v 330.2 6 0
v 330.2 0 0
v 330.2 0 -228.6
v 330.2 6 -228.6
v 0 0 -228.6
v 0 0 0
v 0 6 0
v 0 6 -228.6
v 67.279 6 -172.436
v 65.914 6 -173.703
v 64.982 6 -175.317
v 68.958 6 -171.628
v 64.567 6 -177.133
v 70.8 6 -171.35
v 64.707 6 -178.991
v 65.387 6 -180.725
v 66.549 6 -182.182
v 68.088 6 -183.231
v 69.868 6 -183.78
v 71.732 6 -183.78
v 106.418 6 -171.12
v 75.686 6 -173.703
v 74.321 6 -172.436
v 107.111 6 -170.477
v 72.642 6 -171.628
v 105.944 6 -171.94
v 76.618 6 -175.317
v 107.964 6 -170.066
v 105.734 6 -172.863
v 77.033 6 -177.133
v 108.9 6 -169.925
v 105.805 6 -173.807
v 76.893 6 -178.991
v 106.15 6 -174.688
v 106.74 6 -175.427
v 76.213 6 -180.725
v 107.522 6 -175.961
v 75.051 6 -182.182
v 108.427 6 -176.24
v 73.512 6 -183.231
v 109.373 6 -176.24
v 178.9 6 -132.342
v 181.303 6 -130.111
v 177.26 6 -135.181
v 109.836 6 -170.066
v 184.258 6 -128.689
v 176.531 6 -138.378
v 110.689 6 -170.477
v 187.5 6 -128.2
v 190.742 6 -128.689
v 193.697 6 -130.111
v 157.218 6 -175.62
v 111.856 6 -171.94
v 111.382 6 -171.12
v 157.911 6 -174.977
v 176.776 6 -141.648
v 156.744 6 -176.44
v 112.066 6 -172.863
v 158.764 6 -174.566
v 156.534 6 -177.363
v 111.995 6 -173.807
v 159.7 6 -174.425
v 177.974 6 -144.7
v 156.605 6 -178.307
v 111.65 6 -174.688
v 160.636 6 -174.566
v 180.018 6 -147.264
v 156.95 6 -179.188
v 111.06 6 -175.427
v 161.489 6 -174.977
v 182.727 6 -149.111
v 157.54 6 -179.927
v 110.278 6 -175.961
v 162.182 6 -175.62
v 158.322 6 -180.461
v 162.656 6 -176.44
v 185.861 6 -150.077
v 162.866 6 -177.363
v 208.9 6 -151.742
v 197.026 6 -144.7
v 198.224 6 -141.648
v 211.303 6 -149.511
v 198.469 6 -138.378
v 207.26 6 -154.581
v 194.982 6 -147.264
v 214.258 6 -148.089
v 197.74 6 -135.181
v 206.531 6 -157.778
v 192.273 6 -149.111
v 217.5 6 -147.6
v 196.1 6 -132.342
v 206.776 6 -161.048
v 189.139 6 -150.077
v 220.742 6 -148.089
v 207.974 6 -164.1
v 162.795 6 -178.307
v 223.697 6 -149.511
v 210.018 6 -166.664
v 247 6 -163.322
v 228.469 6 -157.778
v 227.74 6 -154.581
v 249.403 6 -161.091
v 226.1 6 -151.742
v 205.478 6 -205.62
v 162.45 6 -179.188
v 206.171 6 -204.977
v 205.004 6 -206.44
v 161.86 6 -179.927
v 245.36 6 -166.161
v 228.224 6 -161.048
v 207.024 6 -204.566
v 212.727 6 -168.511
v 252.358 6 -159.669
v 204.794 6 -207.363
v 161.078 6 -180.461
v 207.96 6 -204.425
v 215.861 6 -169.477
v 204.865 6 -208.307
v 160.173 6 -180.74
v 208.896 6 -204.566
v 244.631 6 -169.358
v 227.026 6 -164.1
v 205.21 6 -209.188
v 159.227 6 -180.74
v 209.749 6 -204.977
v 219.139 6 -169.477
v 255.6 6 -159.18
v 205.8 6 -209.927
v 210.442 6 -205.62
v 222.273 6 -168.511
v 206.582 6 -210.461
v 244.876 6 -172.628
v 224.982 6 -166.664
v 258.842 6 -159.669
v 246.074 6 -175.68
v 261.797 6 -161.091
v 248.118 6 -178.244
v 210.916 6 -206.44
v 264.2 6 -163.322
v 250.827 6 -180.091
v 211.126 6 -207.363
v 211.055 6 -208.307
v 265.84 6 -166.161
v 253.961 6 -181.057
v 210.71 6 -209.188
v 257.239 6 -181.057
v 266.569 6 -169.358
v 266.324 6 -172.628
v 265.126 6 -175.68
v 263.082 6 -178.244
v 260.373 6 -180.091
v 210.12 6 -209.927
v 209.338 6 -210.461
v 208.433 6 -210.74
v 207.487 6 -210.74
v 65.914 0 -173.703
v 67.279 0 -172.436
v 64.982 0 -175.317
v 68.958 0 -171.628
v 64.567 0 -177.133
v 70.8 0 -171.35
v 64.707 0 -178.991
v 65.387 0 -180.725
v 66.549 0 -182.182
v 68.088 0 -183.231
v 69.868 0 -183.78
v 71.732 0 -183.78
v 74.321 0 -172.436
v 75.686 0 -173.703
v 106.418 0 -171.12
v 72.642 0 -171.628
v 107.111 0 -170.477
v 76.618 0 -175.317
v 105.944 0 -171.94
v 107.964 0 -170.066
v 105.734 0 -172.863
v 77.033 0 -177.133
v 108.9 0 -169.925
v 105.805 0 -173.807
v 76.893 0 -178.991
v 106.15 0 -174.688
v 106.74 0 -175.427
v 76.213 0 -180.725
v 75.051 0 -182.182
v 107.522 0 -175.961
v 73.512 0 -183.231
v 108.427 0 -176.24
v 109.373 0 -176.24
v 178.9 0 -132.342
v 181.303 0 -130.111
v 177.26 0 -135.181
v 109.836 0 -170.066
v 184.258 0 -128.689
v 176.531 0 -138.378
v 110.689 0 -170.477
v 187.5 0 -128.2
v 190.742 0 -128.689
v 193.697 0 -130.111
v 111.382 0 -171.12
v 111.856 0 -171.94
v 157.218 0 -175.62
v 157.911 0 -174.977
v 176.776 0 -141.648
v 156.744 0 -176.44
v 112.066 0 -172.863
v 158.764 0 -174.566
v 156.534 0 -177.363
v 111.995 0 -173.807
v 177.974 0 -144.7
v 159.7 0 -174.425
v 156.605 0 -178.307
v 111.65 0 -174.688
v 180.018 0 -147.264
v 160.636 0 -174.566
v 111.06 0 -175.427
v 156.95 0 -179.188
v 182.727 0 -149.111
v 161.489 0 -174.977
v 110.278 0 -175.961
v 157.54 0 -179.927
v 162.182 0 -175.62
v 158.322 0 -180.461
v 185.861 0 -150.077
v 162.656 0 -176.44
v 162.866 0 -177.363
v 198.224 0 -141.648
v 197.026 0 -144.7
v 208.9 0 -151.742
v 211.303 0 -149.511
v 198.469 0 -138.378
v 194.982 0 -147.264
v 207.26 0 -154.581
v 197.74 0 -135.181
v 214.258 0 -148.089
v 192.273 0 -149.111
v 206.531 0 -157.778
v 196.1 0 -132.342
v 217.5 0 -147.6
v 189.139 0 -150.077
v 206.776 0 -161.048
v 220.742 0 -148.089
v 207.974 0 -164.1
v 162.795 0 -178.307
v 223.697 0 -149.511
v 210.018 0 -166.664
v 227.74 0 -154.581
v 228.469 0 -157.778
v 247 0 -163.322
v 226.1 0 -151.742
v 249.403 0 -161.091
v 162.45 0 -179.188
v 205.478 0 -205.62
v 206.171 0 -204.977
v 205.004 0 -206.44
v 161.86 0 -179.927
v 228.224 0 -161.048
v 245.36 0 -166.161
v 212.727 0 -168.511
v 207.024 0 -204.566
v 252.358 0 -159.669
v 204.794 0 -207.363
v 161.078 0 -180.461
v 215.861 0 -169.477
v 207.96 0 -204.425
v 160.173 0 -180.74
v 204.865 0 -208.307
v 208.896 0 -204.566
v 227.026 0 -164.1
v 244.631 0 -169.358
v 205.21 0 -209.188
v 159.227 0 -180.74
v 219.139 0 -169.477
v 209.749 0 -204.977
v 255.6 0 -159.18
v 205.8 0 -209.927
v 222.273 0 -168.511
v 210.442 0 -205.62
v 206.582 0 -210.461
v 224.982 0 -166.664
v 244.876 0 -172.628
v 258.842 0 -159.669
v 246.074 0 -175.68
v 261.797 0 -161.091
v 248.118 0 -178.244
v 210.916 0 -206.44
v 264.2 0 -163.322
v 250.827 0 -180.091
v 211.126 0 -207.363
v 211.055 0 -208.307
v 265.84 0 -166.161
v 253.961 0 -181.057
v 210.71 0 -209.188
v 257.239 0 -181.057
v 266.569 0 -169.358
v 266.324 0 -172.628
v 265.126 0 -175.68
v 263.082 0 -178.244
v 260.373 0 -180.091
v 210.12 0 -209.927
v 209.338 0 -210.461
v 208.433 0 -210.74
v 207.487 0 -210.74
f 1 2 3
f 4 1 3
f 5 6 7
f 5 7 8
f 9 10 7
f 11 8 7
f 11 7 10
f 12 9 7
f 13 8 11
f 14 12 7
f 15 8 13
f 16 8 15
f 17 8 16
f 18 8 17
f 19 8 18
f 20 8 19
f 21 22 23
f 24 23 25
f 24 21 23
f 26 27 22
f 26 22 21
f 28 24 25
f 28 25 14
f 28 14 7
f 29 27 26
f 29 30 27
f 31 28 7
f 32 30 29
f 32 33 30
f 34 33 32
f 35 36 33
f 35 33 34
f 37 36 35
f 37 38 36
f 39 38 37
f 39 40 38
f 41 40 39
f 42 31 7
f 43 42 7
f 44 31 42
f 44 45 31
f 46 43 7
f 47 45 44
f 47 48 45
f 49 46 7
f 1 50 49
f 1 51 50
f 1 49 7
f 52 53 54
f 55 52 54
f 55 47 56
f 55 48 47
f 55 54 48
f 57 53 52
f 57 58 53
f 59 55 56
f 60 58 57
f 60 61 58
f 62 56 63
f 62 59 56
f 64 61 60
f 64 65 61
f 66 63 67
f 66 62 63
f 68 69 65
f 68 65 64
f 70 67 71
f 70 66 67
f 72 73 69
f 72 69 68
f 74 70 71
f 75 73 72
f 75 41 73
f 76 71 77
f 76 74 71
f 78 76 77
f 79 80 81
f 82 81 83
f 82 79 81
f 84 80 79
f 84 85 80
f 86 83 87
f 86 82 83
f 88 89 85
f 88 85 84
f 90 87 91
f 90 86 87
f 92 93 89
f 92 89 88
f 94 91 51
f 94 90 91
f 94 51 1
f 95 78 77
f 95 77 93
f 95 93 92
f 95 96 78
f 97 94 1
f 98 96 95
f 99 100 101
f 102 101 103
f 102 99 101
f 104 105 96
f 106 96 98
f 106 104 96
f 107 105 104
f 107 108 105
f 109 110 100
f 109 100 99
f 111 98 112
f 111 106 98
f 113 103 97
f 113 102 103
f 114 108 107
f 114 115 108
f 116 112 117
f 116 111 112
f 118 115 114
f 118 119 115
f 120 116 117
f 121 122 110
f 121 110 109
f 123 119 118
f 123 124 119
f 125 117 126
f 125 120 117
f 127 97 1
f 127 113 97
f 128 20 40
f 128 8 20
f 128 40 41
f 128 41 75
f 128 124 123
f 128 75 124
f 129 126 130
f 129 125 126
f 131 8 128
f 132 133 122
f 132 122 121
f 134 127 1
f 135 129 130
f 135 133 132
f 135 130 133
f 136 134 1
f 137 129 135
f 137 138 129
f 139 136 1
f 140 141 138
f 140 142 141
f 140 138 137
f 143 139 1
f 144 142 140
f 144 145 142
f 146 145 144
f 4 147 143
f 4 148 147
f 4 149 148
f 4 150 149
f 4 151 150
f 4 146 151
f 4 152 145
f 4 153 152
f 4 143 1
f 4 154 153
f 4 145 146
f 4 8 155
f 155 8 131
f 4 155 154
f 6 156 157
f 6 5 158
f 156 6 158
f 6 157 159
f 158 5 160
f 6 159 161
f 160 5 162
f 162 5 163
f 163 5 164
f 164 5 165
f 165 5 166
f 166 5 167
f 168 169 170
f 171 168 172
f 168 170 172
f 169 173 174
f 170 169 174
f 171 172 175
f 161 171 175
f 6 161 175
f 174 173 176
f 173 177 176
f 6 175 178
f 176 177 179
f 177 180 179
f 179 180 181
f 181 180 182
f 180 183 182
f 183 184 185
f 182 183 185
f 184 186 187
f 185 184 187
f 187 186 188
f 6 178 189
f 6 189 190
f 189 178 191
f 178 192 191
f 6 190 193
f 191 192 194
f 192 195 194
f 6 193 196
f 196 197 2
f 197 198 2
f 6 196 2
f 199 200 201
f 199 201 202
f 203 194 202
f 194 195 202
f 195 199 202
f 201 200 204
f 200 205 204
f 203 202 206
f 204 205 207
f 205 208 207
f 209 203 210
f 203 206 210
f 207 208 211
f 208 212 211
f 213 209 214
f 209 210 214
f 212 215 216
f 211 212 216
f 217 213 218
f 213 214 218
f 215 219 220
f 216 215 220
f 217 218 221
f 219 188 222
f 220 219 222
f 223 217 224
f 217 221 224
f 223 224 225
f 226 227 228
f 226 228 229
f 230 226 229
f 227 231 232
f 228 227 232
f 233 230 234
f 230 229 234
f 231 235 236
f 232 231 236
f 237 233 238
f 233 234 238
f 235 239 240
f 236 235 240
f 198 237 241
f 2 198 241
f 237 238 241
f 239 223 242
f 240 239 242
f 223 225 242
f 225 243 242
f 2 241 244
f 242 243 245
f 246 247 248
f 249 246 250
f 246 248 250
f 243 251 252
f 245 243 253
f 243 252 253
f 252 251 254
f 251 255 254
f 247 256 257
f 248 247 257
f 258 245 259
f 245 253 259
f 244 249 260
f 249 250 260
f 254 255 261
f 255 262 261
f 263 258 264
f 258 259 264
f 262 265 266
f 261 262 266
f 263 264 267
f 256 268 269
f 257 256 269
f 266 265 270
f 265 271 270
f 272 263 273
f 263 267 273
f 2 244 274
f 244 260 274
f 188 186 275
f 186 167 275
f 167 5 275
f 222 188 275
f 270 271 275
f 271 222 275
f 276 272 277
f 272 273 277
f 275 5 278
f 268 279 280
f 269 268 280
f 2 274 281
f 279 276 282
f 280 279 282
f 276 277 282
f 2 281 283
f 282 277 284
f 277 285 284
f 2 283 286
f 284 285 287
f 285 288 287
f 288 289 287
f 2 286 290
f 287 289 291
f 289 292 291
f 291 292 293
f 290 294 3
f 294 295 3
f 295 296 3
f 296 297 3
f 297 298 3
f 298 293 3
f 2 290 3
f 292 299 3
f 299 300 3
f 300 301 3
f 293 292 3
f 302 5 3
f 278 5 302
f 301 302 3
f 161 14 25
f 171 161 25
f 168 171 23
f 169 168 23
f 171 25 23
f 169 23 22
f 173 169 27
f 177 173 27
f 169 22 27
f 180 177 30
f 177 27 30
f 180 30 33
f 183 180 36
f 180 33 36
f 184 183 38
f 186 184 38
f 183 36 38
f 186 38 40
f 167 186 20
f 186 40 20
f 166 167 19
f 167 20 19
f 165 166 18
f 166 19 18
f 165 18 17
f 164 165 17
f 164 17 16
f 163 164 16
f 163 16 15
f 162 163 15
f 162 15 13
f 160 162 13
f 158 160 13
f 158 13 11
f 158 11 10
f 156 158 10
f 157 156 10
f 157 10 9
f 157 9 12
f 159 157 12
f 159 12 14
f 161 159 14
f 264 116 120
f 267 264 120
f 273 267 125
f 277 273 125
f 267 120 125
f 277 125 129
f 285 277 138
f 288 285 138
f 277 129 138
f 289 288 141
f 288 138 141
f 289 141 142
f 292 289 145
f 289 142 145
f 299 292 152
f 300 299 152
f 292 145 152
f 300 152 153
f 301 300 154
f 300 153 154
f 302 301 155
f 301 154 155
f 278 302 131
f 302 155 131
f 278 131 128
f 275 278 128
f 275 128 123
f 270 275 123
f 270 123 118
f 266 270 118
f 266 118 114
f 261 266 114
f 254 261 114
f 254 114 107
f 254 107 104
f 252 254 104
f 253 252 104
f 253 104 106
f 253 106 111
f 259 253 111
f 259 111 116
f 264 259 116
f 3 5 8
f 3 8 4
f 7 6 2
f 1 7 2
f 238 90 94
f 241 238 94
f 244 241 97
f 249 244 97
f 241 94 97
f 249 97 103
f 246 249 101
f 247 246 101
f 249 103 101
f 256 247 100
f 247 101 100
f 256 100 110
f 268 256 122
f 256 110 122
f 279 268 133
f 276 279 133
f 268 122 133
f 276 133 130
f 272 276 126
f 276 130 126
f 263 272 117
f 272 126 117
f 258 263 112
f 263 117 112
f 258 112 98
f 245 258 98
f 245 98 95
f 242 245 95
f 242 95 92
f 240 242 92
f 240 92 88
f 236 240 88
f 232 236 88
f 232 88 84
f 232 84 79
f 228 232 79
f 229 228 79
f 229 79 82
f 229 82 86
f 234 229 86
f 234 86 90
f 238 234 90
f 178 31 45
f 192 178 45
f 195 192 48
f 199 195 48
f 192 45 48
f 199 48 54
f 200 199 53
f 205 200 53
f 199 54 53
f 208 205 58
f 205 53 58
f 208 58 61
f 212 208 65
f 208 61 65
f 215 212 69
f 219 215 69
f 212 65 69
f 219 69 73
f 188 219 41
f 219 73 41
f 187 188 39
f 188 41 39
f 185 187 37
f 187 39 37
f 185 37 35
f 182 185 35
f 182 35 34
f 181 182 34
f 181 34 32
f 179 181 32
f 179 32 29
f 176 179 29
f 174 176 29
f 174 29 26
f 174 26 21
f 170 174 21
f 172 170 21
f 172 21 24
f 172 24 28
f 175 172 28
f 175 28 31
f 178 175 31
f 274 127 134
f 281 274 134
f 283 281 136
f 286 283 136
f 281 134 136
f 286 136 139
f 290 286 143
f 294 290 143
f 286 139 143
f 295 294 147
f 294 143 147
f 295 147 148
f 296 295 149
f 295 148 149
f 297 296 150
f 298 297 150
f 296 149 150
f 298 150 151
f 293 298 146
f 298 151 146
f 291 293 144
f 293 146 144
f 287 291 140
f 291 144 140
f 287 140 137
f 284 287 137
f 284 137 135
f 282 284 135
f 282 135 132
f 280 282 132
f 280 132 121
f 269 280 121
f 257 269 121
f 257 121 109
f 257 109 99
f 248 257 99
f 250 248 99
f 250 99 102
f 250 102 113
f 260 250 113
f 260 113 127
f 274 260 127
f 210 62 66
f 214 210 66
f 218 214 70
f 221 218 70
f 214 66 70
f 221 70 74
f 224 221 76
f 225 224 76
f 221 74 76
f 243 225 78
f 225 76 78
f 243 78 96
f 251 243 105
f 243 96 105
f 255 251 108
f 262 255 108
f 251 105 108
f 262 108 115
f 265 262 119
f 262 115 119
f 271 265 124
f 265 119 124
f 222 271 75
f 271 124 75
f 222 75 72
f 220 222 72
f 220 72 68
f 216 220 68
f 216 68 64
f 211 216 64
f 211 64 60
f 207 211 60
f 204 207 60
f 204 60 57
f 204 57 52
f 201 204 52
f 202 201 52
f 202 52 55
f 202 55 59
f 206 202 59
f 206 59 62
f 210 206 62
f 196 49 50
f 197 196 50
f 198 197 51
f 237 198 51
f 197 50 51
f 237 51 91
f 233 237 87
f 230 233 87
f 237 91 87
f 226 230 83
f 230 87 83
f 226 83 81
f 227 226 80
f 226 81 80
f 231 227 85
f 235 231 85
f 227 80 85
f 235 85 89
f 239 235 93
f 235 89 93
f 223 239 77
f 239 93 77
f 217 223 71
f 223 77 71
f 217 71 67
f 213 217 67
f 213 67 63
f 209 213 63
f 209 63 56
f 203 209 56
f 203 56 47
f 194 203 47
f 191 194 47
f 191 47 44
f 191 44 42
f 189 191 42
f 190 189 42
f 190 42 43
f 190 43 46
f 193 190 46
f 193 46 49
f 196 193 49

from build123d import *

# Parameters (mm, degrees)
SKETCH1_W           = 330.2
SKETCH1_H           = 228.6
BOSS_EXTRUDE1_DEPTH = 6
SKETCH2_R           = 6.25
SKETCH2_R_2         = 3.175
SKETCH2_R_3         = 11
CUT_EXTRUDE1_DEPTH  = 402.654080024


with BuildPart() as part:
    # Sketch1 → Boss-Extrude1 (new body)
    with BuildSketch(Plane(origin=(0, 0, 0), x_dir=(1, 0, 0), z_dir=(0, 1, 0))):
        with Locations((165.1, 114.3)):
            Rectangle(SKETCH1_W, SKETCH1_H)
    extrude(amount=BOSS_EXTRUDE1_DEPTH)

    # Sketch2 → Cut-Extrude1 (cut, through all)
    with BuildSketch(Plane(origin=(0, 6, 0), x_dir=(1, 0, 0), z_dir=(0, 1, 0))):
        with Locations(Location((70.8, 177.6, 0), (0, 0, 270))):
            Circle(SKETCH2_R)
        with Locations(Location((108.9, 173.1, 0), (0, 0, 270))):
            Circle(SKETCH2_R_2)
        with Locations(Location((159.7, 177.6, 0), (0, 0, 270))):
            Circle(SKETCH2_R_2)
        with Locations(Location((207.96, 207.6, 0), (0, 0, 270))):
            Circle(SKETCH2_R_2)
        with Locations(Location((187.5, 139.2, 0), (0, 0, 270))):
            Circle(SKETCH2_R_3)
        with Locations(Location((217.5, 158.6, 0), (0, 0, 270))):
            Circle(SKETCH2_R_3)
        with Locations(Location((255.6, 170.18, 0), (0, 0, 270))):
            Circle(SKETCH2_R_3)
    extrude(amount=-CUT_EXTRUDE1_DEPTH, mode=Mode.SUBTRACT)


solid = part.part
